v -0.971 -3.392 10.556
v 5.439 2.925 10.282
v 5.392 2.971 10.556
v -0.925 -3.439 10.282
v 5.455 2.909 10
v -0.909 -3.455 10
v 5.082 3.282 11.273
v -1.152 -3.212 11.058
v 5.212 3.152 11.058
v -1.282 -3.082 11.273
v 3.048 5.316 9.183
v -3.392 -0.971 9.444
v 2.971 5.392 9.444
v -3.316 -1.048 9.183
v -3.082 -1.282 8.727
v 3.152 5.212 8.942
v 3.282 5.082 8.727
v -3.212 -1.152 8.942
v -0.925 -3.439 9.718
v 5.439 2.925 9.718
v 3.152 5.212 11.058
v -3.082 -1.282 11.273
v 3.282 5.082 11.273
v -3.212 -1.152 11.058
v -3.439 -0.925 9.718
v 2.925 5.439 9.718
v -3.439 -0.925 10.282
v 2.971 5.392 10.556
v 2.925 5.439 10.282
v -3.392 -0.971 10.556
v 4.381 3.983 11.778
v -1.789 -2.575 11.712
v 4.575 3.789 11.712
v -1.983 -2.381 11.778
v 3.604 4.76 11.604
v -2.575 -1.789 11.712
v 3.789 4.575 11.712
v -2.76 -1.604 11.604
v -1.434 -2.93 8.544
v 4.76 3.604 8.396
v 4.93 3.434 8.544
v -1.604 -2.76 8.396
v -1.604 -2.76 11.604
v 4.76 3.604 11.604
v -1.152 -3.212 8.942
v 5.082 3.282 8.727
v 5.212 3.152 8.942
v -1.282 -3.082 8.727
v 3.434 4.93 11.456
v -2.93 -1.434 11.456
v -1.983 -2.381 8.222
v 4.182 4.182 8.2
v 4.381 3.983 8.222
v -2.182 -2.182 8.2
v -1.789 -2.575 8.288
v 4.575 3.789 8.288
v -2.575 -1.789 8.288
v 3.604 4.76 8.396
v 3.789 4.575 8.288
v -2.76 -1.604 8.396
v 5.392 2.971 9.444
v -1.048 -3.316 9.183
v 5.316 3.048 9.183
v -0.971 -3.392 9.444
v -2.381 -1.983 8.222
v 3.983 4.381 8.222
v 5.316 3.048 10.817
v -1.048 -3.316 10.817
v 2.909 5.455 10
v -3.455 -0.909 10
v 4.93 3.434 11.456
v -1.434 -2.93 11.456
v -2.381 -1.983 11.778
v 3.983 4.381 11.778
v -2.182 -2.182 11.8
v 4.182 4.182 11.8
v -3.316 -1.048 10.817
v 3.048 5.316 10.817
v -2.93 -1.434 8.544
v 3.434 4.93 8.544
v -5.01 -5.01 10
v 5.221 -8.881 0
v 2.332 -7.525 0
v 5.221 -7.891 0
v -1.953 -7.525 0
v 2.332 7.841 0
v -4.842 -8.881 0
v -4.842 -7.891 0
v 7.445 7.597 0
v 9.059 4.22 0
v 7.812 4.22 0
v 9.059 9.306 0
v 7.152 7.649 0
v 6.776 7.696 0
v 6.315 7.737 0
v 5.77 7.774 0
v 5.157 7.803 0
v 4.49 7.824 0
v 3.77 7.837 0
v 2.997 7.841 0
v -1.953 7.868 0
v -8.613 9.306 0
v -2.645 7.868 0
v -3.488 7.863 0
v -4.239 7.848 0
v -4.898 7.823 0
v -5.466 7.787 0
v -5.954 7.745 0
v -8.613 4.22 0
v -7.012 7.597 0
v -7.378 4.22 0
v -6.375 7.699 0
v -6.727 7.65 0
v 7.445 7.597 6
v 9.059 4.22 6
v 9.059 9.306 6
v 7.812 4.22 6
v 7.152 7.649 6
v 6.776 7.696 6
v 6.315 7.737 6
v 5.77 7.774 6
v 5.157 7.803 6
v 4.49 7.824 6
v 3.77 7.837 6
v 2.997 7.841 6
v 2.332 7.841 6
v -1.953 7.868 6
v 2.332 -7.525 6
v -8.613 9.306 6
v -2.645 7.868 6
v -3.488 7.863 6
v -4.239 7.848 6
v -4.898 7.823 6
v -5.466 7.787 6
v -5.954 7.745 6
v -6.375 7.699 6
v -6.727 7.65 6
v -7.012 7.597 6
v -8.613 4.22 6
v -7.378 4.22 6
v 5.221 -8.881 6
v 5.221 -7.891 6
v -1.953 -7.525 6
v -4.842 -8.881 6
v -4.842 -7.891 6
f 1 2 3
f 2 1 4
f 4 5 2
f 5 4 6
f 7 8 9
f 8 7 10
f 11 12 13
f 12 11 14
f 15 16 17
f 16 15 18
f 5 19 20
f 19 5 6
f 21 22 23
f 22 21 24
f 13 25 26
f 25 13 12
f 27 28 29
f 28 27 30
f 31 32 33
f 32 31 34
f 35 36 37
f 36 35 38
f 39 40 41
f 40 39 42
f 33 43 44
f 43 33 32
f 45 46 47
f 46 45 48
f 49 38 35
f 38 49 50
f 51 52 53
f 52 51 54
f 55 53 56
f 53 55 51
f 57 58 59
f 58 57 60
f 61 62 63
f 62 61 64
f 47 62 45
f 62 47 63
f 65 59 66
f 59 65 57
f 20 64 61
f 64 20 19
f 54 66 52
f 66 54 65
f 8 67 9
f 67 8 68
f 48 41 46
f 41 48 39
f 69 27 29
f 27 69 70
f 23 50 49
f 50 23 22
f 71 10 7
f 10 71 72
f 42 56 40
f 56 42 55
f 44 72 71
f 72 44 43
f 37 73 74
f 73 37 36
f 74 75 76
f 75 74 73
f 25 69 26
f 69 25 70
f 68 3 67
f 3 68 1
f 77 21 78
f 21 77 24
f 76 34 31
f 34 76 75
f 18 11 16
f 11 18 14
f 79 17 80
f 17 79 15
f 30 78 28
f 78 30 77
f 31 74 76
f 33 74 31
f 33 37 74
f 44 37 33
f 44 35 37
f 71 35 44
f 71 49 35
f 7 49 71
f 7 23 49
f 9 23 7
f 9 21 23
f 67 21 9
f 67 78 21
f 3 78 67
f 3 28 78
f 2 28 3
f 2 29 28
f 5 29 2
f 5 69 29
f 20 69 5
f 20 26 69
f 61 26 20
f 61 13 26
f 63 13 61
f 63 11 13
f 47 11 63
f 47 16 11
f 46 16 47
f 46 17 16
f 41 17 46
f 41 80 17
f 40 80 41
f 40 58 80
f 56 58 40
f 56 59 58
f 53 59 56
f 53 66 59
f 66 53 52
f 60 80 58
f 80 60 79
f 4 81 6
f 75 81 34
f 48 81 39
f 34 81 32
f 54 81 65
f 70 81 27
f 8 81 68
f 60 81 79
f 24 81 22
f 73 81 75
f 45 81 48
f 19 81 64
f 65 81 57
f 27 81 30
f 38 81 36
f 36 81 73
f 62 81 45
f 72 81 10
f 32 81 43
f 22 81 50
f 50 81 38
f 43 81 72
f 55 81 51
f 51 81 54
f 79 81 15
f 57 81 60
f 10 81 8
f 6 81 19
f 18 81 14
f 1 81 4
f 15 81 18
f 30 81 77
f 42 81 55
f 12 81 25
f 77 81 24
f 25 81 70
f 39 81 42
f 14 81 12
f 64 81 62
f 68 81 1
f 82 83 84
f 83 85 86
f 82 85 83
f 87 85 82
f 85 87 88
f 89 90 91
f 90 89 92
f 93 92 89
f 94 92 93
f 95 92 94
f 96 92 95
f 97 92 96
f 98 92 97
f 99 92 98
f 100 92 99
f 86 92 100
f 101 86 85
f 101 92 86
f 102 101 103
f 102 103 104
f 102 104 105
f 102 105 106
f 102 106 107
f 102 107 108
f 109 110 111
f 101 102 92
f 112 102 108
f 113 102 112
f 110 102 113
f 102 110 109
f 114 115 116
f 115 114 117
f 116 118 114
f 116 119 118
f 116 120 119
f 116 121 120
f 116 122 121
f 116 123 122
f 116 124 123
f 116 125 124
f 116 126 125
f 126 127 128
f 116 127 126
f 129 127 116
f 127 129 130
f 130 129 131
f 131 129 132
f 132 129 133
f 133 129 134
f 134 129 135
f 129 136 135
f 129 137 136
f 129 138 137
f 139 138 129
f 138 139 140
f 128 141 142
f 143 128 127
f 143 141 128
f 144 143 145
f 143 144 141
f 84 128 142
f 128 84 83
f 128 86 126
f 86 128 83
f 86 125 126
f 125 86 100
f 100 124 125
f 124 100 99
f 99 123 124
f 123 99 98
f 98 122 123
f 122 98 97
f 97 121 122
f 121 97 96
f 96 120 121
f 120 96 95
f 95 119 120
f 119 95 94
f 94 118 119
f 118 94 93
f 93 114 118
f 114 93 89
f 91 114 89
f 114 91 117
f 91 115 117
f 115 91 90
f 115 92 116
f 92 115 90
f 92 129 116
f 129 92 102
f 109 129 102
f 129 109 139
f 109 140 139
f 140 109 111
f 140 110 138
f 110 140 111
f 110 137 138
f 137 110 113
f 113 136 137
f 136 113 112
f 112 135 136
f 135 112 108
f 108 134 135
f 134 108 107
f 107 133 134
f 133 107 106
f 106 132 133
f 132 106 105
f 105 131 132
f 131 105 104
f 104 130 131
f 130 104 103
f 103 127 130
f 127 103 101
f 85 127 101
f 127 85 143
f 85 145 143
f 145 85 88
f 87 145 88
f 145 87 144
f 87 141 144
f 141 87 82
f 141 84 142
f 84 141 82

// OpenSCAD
// file: Pencil.scad
//=============================================================================
// Pencil added to an icon to show it is used for editing.
// =============================================================================

module Pencil() {
  rotate([90, 0, -45]) union() {
    radius    = 1.8;
    cylHeight = 9;
    coneHeight = 4;
    cylinder(r = radius, h = cylHeight, center = true);
    translate([0, 0, (cylHeight + coneHeight) / 2])
      cylinder(r1 = radius, r2 = 0, h = coneHeight, center = true);
  }
}

$fn = 40;
Pencil();
// main file
use <Pencil.scad>

module TextToolIcon() {
  linear_extrude(height = 6) {
    text(text = "T", font="Liberation Serif:style=Bold",
         size = 20, halign = "center", valign = "center");
  }
  translate([1, 1, 10]) Pencil();
}

TextToolIcon();
